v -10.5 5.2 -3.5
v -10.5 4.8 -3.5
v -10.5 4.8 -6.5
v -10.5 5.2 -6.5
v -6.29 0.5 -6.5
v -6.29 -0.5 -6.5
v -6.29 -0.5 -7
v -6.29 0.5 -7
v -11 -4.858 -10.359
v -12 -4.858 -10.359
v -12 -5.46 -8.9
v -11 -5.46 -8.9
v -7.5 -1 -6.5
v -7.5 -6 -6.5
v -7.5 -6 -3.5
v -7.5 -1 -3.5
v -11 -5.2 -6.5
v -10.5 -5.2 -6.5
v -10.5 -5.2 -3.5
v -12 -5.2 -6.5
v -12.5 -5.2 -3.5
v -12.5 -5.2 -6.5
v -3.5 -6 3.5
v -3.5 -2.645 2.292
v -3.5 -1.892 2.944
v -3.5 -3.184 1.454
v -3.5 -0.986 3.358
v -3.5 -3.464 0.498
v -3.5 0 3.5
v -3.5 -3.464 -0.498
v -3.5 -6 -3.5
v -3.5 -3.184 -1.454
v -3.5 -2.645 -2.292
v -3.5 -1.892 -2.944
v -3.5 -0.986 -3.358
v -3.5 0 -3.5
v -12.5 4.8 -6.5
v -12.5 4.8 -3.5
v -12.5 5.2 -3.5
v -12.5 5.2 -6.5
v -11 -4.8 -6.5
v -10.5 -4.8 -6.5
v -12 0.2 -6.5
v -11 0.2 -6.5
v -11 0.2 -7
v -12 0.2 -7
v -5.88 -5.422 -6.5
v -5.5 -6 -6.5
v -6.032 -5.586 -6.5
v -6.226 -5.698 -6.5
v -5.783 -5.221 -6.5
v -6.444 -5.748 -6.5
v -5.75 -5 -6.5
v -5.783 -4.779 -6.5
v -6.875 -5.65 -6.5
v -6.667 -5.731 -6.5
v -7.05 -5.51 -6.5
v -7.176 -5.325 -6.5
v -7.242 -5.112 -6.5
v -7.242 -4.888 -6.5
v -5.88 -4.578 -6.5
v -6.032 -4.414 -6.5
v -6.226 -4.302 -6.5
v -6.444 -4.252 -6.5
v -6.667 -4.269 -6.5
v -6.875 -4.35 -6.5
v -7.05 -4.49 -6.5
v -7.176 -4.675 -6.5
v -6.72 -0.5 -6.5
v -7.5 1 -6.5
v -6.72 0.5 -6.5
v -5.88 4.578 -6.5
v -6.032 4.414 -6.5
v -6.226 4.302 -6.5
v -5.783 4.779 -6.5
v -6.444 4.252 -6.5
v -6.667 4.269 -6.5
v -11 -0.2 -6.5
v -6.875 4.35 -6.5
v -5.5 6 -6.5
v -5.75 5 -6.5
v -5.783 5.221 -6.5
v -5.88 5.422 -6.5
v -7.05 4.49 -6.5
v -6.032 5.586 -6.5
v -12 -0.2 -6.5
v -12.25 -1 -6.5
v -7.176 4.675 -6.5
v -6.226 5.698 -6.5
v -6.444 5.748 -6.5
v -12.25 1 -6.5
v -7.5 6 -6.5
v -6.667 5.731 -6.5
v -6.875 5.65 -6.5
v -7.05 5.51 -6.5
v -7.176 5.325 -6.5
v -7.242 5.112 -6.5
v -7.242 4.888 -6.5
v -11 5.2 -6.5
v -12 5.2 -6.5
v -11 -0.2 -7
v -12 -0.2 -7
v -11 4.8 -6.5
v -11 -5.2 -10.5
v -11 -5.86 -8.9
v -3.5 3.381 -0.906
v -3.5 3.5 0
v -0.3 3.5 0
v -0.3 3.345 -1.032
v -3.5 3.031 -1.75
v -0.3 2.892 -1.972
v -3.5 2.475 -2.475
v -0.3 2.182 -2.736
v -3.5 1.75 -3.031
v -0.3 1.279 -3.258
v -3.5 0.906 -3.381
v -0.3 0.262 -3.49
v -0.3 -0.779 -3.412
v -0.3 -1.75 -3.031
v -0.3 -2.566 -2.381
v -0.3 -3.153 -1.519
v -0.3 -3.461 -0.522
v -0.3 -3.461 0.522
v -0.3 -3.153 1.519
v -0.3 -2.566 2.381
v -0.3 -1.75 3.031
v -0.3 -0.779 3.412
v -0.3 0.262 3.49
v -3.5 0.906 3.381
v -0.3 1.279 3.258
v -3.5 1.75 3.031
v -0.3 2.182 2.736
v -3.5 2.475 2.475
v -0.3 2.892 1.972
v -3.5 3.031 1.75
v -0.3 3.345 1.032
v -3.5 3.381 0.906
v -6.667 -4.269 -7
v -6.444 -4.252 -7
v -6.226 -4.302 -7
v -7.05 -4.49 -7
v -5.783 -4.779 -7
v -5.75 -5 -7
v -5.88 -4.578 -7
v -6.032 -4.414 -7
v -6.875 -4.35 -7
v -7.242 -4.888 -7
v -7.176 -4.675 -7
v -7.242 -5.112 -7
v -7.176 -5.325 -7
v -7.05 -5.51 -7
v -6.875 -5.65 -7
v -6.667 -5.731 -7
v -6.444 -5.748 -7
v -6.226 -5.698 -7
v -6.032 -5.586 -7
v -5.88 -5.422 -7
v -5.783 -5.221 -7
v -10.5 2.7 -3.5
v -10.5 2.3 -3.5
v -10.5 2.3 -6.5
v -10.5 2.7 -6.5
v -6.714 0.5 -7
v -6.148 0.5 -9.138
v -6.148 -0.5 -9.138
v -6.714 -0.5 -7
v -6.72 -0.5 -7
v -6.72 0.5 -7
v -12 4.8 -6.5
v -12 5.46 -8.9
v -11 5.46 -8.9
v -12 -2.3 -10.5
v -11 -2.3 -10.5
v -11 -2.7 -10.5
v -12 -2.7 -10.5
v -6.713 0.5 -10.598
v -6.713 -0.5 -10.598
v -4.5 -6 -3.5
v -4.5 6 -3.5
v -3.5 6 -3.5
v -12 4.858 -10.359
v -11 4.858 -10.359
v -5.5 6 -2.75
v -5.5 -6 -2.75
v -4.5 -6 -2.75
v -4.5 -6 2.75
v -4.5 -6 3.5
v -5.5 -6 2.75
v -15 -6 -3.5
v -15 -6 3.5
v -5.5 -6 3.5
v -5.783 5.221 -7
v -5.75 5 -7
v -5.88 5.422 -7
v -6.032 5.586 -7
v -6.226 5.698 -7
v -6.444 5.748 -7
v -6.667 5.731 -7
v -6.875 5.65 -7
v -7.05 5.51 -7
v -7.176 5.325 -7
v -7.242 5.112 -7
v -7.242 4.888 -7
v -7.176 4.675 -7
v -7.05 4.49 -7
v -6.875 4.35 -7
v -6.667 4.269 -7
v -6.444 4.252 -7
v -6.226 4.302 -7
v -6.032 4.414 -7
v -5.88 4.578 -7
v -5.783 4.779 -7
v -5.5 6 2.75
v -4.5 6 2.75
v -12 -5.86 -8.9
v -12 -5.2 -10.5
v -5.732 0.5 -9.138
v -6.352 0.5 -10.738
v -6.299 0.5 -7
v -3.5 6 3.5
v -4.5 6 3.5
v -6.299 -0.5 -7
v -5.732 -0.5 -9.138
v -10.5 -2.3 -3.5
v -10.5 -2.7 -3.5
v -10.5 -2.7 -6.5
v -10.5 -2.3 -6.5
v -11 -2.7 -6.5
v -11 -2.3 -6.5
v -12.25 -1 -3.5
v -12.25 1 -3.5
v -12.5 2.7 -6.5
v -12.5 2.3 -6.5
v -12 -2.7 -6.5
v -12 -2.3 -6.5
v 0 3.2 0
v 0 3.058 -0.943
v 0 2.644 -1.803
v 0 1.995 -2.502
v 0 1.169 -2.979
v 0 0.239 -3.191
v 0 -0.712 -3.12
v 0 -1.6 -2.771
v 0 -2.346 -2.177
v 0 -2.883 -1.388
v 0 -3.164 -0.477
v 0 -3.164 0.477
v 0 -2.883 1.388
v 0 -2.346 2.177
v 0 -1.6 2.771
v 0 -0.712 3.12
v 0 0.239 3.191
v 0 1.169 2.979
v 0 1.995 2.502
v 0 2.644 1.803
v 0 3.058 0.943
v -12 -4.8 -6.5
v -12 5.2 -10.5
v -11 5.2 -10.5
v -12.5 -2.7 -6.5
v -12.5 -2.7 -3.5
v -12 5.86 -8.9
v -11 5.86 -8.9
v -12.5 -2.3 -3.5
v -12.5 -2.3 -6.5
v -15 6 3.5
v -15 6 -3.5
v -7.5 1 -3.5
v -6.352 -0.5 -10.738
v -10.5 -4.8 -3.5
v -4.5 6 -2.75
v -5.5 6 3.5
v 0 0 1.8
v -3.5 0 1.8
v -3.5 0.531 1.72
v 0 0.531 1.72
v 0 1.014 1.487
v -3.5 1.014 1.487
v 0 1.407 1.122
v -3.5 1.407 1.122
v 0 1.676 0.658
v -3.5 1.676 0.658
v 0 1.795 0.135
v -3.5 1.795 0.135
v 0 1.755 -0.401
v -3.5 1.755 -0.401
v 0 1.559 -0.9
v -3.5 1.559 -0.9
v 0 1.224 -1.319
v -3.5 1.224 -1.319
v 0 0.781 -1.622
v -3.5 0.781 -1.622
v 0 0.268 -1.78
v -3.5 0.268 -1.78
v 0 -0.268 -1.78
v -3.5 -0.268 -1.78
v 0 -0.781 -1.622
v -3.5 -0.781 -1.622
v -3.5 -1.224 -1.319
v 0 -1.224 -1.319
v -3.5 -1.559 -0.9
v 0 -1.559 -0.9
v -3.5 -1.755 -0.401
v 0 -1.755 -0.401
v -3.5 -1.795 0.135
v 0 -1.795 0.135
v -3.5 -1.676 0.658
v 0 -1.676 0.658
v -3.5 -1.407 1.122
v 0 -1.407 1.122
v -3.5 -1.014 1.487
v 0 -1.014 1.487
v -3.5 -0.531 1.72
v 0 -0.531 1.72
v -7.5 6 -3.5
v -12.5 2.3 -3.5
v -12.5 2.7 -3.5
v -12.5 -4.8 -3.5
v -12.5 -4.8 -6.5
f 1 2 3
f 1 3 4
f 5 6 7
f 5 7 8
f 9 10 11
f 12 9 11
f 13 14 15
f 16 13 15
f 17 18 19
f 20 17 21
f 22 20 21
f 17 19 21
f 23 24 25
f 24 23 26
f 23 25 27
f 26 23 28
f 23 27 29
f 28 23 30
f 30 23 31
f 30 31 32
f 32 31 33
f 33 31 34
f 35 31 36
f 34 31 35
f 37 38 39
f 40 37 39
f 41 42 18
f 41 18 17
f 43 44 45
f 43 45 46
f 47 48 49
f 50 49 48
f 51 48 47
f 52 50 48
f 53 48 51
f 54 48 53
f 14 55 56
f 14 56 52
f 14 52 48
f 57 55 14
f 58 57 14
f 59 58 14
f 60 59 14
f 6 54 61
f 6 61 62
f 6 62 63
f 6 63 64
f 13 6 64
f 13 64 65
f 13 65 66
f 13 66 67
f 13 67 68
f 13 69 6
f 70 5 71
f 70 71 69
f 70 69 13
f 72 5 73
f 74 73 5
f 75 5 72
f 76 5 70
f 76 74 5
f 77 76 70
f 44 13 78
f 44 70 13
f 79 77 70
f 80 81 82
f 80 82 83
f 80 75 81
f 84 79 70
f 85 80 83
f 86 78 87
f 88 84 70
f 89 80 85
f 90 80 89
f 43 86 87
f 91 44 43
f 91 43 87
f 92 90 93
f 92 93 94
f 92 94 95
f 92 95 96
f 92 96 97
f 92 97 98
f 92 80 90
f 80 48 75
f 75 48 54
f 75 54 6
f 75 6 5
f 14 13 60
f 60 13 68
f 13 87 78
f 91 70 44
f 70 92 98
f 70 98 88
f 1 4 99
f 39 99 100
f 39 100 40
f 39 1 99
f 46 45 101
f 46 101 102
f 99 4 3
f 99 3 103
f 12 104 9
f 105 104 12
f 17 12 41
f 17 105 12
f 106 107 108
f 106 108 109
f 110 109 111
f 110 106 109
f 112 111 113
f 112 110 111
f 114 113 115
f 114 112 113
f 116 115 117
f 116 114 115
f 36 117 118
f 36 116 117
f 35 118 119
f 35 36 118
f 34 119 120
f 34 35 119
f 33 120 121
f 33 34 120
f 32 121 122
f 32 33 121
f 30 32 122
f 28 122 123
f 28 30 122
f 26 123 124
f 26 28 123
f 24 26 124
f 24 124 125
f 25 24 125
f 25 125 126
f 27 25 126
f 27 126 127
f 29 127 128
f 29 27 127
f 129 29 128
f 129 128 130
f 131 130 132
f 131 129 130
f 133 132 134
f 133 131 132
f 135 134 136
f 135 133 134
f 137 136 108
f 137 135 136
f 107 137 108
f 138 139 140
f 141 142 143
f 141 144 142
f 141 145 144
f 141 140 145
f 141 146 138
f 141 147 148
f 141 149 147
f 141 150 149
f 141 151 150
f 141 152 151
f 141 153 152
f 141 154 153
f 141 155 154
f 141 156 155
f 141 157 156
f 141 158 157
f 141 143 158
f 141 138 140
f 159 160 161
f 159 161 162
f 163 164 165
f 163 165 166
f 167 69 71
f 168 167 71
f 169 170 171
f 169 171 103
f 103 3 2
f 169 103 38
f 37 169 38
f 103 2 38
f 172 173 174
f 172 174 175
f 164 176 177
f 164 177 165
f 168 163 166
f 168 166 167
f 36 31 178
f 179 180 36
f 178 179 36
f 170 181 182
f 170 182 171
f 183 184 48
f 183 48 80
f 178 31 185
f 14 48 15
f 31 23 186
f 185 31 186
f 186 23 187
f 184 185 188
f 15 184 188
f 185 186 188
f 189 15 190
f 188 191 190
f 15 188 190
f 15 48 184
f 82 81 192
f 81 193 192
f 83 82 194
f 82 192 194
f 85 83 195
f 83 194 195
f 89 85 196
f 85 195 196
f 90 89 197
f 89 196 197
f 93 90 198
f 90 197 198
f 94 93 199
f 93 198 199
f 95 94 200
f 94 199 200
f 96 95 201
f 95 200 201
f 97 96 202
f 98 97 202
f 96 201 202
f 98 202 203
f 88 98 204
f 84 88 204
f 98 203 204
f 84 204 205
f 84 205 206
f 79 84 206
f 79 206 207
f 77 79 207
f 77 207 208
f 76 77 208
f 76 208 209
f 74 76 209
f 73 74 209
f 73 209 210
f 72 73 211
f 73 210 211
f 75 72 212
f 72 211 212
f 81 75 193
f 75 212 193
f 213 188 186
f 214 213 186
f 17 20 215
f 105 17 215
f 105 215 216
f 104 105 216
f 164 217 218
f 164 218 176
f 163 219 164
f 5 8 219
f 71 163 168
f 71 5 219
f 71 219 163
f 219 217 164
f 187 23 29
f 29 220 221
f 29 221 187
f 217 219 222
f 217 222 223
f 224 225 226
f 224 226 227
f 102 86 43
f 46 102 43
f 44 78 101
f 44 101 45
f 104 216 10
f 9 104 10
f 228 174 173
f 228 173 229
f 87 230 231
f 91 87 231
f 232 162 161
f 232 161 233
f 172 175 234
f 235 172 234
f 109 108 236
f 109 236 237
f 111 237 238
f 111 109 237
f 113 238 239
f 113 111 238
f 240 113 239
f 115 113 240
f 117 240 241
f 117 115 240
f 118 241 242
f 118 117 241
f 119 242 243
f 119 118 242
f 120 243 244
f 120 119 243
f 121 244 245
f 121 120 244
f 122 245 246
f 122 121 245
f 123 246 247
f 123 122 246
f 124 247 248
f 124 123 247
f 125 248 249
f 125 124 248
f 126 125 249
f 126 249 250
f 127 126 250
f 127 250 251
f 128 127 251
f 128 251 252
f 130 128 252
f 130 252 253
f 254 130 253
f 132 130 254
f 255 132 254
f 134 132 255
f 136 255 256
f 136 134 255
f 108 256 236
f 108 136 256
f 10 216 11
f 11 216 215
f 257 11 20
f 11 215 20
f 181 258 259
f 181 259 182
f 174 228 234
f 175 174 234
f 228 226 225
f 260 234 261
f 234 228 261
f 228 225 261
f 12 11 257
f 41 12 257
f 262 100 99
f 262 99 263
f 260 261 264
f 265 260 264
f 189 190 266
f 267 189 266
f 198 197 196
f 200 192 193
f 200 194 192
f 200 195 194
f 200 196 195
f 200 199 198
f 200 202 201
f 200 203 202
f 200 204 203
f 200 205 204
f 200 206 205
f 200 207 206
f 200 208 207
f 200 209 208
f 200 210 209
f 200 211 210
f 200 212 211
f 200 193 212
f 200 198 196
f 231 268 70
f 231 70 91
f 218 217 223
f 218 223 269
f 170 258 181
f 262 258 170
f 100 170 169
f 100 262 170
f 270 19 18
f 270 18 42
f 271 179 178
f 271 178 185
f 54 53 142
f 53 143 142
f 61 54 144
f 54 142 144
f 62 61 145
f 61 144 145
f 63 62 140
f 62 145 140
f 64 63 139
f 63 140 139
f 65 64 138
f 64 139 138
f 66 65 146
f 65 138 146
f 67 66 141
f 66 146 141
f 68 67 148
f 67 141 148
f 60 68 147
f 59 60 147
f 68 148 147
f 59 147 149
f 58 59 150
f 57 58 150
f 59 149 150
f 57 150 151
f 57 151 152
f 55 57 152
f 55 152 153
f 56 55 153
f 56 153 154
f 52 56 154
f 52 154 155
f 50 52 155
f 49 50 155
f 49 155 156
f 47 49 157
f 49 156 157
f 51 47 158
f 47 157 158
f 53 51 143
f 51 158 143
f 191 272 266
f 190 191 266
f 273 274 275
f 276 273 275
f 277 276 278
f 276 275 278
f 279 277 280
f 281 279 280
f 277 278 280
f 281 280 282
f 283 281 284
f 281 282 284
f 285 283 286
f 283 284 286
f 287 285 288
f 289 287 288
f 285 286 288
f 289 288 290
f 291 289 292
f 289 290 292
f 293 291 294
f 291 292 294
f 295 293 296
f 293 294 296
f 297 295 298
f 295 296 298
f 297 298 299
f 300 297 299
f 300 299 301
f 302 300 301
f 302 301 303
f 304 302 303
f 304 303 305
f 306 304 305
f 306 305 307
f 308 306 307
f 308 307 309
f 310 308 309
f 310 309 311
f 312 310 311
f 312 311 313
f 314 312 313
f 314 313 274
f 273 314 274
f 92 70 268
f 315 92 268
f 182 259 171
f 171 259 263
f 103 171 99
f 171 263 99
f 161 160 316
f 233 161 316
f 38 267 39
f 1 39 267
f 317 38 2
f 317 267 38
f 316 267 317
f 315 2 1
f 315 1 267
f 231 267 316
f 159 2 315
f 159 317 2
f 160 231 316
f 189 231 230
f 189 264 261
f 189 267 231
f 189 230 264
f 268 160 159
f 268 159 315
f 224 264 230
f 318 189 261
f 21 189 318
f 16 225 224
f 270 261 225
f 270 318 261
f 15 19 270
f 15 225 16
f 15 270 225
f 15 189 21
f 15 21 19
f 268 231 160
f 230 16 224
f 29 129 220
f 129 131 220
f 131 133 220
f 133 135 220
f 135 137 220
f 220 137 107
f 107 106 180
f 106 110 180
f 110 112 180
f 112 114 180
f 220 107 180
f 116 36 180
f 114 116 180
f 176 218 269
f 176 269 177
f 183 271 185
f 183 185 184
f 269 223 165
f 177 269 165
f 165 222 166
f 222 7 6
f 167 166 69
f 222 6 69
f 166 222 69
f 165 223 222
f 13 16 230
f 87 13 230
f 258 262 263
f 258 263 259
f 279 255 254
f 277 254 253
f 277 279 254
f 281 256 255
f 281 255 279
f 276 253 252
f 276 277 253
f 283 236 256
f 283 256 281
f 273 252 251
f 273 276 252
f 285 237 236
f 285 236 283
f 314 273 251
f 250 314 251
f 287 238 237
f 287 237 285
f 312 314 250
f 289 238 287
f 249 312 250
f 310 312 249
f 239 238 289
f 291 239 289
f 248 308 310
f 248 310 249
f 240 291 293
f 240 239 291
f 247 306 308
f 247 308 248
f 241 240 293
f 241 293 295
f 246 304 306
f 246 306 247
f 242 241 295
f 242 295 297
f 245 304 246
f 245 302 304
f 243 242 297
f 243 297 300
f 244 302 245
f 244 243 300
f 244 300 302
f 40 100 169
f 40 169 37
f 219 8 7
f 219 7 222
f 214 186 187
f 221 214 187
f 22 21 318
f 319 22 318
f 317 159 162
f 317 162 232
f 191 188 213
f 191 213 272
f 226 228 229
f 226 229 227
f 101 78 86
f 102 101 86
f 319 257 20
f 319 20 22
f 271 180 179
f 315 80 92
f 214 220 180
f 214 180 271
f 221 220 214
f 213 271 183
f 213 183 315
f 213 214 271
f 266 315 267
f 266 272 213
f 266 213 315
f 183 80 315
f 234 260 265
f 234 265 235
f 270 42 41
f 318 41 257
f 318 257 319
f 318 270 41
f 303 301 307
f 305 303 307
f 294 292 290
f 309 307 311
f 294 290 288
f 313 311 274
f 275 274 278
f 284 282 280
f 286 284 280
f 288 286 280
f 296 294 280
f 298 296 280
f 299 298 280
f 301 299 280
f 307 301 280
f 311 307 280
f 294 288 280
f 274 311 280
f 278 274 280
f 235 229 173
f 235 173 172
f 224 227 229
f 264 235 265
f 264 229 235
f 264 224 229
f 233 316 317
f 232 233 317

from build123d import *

# Parameters (mm, degrees)
ESBO_O1_W                        = 11.5
ESBO_O1_H                        = 12
RESSALTO_EXTRUS_O1_DEPTH         = 7
ESBO_O2_W                        = 10.5
ESBO_O2_H                        = 0.75
CORTE_EXTRUS_O1_DEPTH            = 13
ESBO_O3_W                        = 9.5
ESBO_O3_H                        = 12
RESSALTO_EXTRUS_O2_DEPTH         = 3.75
ESBO_O4_W                        = 7.5
ESBO_O4_H                        = 3
CORTE_EXTRUS_O2_DEPTH            = 13
ESBO_O5_W                        = 2
ESBO_O5_H                        = 0.4
RESSALTO_EXTRUS_O3_DEPTH         = 7
ESBO_O6_W                        = 0.5
ESBO_O6_H                        = 4
CORTE_EXTRUS_O3_DEPTH            = 9.7
ESBO_O7_W                        = 0.5
ESBO_O7_H                        = 4
CORTE_EXTRUS_O4_DEPTH            = 9.7
ESBO_O8_W                        = 4.75
ESBO_O8_H                        = 2
RESSALTO_EXTRUS_O4_DEPTH         = 3
ESBO_O9_W                        = 1
ESBO_O9_H                        = 0.75
CORTE_EXTRUS_O5_DEPTH            = 13
ESBO_O10_W                       = 2
ESBO_O10_H                       = 0.4
RESSALTO_EXTRUS_O5_DEPTH         = 3
ESBO_O11_W                       = 2
ESBO_O11_H                       = 0.4
RESSALTO_EXTRUS_O6_DEPTH         = 3
ESBO_O12_W                       = 2
ESBO_O12_H                       = 0.4
RESSALTO_EXTRUS_O7_DEPTH         = 3
ESBO_O13_W                       = 1
ESBO_O13_H                       = 0.4
RESSALTO_EXTRUS_O8_DEPTH         = 0.5
ESBO_O14_W                       = 0.75
ESBO_O14_H                       = 0.5
ESBO_O15_W                       = 0.75
ESBO_O15_H                       = 0.5
ESBO_O16_W                       = 3.5
ESBO_O16_H                       = 3.5
FURO_DE_DI_METRO_3_6_3_6_1_D     = 3.6
FURO_DE_DI_METRO_3_6_3_6_1_DEPTH = 3.5
CHANFRO1_SIZE                    = 0.3
ESBO_O19_W                       = 0.43
ESBO_O19_H                       = 1
RESSALTO_EXTRUS_O9_DEPTH         = 0.5
RESSALTO_EXTRUS_O10_DEPTH        = 0.5
RESSALTO_EXTRUS_O11_START        = -0.5
RESSALTO_EXTRUS_O11_DEPTH        = 1


with BuildPart() as part:
    # Esboço1 → Ressalto-extrusão1 (new body)
    with BuildSketch(Plane(origin=(0, 0, -3.5), x_dir=(-1, 0, 0), z_dir=(0, 0, -1))):
        with Locations((9.25, 0)):
            Rectangle(ESBO_O1_W, ESBO_O1_H)
    extrude(amount=-RESSALTO_EXTRUS_O1_DEPTH)

    # Esboço2 → Corte-extrusão1 (cut, through all)
    with BuildSketch(Plane(origin=(0, 6, 0), x_dir=(-1, 0, 0), z_dir=(0, 1, 0))):
        with Locations((9.75, -3.125)):
            Rectangle(ESBO_O2_W, ESBO_O2_H)
    extrude(amount=-CORTE_EXTRUS_O1_DEPTH, mode=Mode.SUBTRACT)

    # Esboço3 → Ressalto-extrusão2 (add)
    with BuildSketch(Plane(origin=(0, 0, -2.75), x_dir=(-1, 0, 0), z_dir=(0, 0, -1))):
        with Locations((10.25, 0)):
            Rectangle(ESBO_O3_W, ESBO_O3_H)
    extrude(amount=RESSALTO_EXTRUS_O2_DEPTH)

    # Esboço4 → Corte-extrusão2 (cut, through all)
    with BuildSketch(Plane.XZ.offset(6)):
        with Locations((-11.25, -5)):
            Rectangle(ESBO_O4_W, ESBO_O4_H)
    extrude(amount=-CORTE_EXTRUS_O2_DEPTH, mode=Mode.SUBTRACT)

    # Esboço5 → Ressalto-extrusão3 (add)
    with BuildSketch(Plane(origin=(0, 0, -3.5), x_dir=(-1, 0, 0), z_dir=(0, 0, -1))):
        with Locations((11.5, -2.5)):
            Rectangle(ESBO_O5_W, ESBO_O5_H)
    extrude(amount=RESSALTO_EXTRUS_O3_DEPTH)

    # Esboço6 → Corte-extrusão3 (cut, through all)
    with BuildSketch(Plane.XZ.offset(2.7)):
        with Locations((-10.75, -8.5)):
            Rectangle(ESBO_O6_W, ESBO_O6_H)
    extrude(amount=-CORTE_EXTRUS_O3_DEPTH, mode=Mode.SUBTRACT)

    # Esboço7 → Corte-extrusão4 (cut, through all)
    with BuildSketch(Plane.XZ.offset(2.7)):
        with Locations((-12.25, -8.5)):
            Rectangle(ESBO_O7_W, ESBO_O7_H)
    extrude(amount=-CORTE_EXTRUS_O4_DEPTH, mode=Mode.SUBTRACT)

    # Esboço8 → Ressalto-extrusão4 (add)
    with BuildSketch(Plane(origin=(0, 0, -3.5), x_dir=(-1, 0, 0), z_dir=(0, 0, -1))):
        with Locations((9.875, 0)):
            Rectangle(ESBO_O8_W, ESBO_O8_H)
    extrude(amount=RESSALTO_EXTRUS_O4_DEPTH)

    # Esboço9 → Corte-extrusão5 (cut, through all)
    with BuildSketch(Plane.XZ.offset(6)):
        with Locations((-5, 3.125)):
            Rectangle(ESBO_O9_W, ESBO_O9_H)
    extrude(amount=-CORTE_EXTRUS_O5_DEPTH, mode=Mode.SUBTRACT)

    # Esboço10 → Ressalto-extrusão5 (add)
    with BuildSketch(Plane(origin=(0, 0, -3.5), x_dir=(-1, 0, 0), z_dir=(0, 0, -1))):
        with Locations((11.5, 5)):
            Rectangle(ESBO_O10_W, ESBO_O10_H)
    extrude(amount=RESSALTO_EXTRUS_O5_DEPTH)

    # Esboço11 → Ressalto-extrusão6 (add)
    with BuildSketch(Plane(origin=(0, 0, -3.5), x_dir=(-1, 0, 0), z_dir=(0, 0, -1))):
        with Locations((11.5, -5)):
            Rectangle(ESBO_O11_W, ESBO_O11_H)
    extrude(amount=RESSALTO_EXTRUS_O6_DEPTH)

    # Esboço12 → Ressalto-extrusão7 (add)
    with BuildSketch(Plane(origin=(0, 0, -3.5), x_dir=(-1, 0, 0), z_dir=(0, 0, -1))):
        with Locations((11.5, 2.5)):
            Rectangle(ESBO_O12_W, ESBO_O12_H)
    extrude(amount=RESSALTO_EXTRUS_O7_DEPTH)

    # Esboço13 → Ressalto-extrusão8 (add)
    with BuildSketch(Plane(origin=(0, 0, -6.5), x_dir=(-1, 0, 0), z_dir=(0, 0, -1))):
        with Locations((11.5, 0)):
            Rectangle(ESBO_O13_W, ESBO_O13_H)
    extrude(amount=RESSALTO_EXTRUS_O8_DEPTH)

    # Esboço14 → Revolução1 (revolve)
    with BuildSketch(Plane(origin=(0, -5, 0), x_dir=(1, 0, 0), z_dir=(0, 1, 0))):
        with Locations((-6.125, 6.75)):
            Rectangle(ESBO_O14_W, ESBO_O14_H)
    revolve(axis=Axis((-6.5, -5, -7), (0, 0, 1)))

    # Esboço15 → Revolução2 (revolve)
    with BuildSketch(Plane(origin=(0, 5, 0), x_dir=(1, 0, 0), z_dir=(0, 1, 0))):
        with Locations((-6.125, 6.75)):
            Rectangle(ESBO_O15_W, ESBO_O15_H)
    revolve(axis=Axis((-6.5, 5, -7), (0, 0, 1)))

    # Esboço16 → Revolução3 (revolve)
    with BuildSketch(Plane(origin=(0, 0, 0), x_dir=(-1, 0, 0), z_dir=(0, 0, -1))):
        with Locations((1.75, 1.75)):
            Rectangle(ESBO_O16_W, ESBO_O16_H)
    revolve(axis=Axis((0, 0, 0), (-1, 0, 0)))

    # Furo de diâmetro Ø3.6 (3.6)1
    with Locations(Plane(origin=(0, 0, 0), x_dir=(0, 0, -1), z_dir=(1, 0, 0))):
        with Locations((0, 0)):
            Hole(FURO_DE_DI_METRO_3_6_3_6_1_D / 2, depth=FURO_DE_DI_METRO_3_6_3_6_1_DEPTH)

    # Chanfro1
    chanfro1_edges = [part.edges().sort_by_distance(p)[0] for p in [
        (0, -3.5, 0),
    ]]
    chamfer(chanfro1_edges, length=CHANFRO1_SIZE)

    # Esboço19 → Ressalto-extrusão9 (add)
    with BuildSketch(Plane(origin=(0, 0, -6.5), x_dir=(-1, 0, 0), z_dir=(0, 0, -1))):
        with Locations((6.505, 0)):
            Rectangle(ESBO_O19_W, ESBO_O19_H)
    extrude(amount=RESSALTO_EXTRUS_O9_DEPTH)

    # Esboço20 → Ressalto-extrusão10 (add, symmetric)
    with BuildSketch(Plane(origin=(0, 0, 0), x_dir=(1, 0, 0), z_dir=(0, 1, 0))):
        Polygon((-6.302158206, 6.98750552), (-5.732158206, 9.13750552), (-6.352158206, 10.73750552), (-6.713447386, 10.597505963), (-6.147697214, 9.13750552), (-6.717697214, 6.98750552), align=None)
    extrude(amount=RESSALTO_EXTRUS_O10_DEPTH, both=True)

    # Esboço21 → Ressalto-extrusão11 (add)
    with BuildSketch(Plane.ZY.offset(12.5).offset(RESSALTO_EXTRUS_O11_START)):
        Polygon((-6.5, 5.2), (-8.9, 5.86), (-10.5, 5.2), (-10.35899319, 4.858165309), (-8.9, 5.46), (-6.5, 4.8), align=None)
    ressalto_extrus_o11 = extrude(amount=-RESSALTO_EXTRUS_O11_DEPTH)

    # Espelhar1: Ressalto-extrusão11 across plane
    add(ressalto_extrus_o11.mirror(Plane.ZX))


solid = part.part
